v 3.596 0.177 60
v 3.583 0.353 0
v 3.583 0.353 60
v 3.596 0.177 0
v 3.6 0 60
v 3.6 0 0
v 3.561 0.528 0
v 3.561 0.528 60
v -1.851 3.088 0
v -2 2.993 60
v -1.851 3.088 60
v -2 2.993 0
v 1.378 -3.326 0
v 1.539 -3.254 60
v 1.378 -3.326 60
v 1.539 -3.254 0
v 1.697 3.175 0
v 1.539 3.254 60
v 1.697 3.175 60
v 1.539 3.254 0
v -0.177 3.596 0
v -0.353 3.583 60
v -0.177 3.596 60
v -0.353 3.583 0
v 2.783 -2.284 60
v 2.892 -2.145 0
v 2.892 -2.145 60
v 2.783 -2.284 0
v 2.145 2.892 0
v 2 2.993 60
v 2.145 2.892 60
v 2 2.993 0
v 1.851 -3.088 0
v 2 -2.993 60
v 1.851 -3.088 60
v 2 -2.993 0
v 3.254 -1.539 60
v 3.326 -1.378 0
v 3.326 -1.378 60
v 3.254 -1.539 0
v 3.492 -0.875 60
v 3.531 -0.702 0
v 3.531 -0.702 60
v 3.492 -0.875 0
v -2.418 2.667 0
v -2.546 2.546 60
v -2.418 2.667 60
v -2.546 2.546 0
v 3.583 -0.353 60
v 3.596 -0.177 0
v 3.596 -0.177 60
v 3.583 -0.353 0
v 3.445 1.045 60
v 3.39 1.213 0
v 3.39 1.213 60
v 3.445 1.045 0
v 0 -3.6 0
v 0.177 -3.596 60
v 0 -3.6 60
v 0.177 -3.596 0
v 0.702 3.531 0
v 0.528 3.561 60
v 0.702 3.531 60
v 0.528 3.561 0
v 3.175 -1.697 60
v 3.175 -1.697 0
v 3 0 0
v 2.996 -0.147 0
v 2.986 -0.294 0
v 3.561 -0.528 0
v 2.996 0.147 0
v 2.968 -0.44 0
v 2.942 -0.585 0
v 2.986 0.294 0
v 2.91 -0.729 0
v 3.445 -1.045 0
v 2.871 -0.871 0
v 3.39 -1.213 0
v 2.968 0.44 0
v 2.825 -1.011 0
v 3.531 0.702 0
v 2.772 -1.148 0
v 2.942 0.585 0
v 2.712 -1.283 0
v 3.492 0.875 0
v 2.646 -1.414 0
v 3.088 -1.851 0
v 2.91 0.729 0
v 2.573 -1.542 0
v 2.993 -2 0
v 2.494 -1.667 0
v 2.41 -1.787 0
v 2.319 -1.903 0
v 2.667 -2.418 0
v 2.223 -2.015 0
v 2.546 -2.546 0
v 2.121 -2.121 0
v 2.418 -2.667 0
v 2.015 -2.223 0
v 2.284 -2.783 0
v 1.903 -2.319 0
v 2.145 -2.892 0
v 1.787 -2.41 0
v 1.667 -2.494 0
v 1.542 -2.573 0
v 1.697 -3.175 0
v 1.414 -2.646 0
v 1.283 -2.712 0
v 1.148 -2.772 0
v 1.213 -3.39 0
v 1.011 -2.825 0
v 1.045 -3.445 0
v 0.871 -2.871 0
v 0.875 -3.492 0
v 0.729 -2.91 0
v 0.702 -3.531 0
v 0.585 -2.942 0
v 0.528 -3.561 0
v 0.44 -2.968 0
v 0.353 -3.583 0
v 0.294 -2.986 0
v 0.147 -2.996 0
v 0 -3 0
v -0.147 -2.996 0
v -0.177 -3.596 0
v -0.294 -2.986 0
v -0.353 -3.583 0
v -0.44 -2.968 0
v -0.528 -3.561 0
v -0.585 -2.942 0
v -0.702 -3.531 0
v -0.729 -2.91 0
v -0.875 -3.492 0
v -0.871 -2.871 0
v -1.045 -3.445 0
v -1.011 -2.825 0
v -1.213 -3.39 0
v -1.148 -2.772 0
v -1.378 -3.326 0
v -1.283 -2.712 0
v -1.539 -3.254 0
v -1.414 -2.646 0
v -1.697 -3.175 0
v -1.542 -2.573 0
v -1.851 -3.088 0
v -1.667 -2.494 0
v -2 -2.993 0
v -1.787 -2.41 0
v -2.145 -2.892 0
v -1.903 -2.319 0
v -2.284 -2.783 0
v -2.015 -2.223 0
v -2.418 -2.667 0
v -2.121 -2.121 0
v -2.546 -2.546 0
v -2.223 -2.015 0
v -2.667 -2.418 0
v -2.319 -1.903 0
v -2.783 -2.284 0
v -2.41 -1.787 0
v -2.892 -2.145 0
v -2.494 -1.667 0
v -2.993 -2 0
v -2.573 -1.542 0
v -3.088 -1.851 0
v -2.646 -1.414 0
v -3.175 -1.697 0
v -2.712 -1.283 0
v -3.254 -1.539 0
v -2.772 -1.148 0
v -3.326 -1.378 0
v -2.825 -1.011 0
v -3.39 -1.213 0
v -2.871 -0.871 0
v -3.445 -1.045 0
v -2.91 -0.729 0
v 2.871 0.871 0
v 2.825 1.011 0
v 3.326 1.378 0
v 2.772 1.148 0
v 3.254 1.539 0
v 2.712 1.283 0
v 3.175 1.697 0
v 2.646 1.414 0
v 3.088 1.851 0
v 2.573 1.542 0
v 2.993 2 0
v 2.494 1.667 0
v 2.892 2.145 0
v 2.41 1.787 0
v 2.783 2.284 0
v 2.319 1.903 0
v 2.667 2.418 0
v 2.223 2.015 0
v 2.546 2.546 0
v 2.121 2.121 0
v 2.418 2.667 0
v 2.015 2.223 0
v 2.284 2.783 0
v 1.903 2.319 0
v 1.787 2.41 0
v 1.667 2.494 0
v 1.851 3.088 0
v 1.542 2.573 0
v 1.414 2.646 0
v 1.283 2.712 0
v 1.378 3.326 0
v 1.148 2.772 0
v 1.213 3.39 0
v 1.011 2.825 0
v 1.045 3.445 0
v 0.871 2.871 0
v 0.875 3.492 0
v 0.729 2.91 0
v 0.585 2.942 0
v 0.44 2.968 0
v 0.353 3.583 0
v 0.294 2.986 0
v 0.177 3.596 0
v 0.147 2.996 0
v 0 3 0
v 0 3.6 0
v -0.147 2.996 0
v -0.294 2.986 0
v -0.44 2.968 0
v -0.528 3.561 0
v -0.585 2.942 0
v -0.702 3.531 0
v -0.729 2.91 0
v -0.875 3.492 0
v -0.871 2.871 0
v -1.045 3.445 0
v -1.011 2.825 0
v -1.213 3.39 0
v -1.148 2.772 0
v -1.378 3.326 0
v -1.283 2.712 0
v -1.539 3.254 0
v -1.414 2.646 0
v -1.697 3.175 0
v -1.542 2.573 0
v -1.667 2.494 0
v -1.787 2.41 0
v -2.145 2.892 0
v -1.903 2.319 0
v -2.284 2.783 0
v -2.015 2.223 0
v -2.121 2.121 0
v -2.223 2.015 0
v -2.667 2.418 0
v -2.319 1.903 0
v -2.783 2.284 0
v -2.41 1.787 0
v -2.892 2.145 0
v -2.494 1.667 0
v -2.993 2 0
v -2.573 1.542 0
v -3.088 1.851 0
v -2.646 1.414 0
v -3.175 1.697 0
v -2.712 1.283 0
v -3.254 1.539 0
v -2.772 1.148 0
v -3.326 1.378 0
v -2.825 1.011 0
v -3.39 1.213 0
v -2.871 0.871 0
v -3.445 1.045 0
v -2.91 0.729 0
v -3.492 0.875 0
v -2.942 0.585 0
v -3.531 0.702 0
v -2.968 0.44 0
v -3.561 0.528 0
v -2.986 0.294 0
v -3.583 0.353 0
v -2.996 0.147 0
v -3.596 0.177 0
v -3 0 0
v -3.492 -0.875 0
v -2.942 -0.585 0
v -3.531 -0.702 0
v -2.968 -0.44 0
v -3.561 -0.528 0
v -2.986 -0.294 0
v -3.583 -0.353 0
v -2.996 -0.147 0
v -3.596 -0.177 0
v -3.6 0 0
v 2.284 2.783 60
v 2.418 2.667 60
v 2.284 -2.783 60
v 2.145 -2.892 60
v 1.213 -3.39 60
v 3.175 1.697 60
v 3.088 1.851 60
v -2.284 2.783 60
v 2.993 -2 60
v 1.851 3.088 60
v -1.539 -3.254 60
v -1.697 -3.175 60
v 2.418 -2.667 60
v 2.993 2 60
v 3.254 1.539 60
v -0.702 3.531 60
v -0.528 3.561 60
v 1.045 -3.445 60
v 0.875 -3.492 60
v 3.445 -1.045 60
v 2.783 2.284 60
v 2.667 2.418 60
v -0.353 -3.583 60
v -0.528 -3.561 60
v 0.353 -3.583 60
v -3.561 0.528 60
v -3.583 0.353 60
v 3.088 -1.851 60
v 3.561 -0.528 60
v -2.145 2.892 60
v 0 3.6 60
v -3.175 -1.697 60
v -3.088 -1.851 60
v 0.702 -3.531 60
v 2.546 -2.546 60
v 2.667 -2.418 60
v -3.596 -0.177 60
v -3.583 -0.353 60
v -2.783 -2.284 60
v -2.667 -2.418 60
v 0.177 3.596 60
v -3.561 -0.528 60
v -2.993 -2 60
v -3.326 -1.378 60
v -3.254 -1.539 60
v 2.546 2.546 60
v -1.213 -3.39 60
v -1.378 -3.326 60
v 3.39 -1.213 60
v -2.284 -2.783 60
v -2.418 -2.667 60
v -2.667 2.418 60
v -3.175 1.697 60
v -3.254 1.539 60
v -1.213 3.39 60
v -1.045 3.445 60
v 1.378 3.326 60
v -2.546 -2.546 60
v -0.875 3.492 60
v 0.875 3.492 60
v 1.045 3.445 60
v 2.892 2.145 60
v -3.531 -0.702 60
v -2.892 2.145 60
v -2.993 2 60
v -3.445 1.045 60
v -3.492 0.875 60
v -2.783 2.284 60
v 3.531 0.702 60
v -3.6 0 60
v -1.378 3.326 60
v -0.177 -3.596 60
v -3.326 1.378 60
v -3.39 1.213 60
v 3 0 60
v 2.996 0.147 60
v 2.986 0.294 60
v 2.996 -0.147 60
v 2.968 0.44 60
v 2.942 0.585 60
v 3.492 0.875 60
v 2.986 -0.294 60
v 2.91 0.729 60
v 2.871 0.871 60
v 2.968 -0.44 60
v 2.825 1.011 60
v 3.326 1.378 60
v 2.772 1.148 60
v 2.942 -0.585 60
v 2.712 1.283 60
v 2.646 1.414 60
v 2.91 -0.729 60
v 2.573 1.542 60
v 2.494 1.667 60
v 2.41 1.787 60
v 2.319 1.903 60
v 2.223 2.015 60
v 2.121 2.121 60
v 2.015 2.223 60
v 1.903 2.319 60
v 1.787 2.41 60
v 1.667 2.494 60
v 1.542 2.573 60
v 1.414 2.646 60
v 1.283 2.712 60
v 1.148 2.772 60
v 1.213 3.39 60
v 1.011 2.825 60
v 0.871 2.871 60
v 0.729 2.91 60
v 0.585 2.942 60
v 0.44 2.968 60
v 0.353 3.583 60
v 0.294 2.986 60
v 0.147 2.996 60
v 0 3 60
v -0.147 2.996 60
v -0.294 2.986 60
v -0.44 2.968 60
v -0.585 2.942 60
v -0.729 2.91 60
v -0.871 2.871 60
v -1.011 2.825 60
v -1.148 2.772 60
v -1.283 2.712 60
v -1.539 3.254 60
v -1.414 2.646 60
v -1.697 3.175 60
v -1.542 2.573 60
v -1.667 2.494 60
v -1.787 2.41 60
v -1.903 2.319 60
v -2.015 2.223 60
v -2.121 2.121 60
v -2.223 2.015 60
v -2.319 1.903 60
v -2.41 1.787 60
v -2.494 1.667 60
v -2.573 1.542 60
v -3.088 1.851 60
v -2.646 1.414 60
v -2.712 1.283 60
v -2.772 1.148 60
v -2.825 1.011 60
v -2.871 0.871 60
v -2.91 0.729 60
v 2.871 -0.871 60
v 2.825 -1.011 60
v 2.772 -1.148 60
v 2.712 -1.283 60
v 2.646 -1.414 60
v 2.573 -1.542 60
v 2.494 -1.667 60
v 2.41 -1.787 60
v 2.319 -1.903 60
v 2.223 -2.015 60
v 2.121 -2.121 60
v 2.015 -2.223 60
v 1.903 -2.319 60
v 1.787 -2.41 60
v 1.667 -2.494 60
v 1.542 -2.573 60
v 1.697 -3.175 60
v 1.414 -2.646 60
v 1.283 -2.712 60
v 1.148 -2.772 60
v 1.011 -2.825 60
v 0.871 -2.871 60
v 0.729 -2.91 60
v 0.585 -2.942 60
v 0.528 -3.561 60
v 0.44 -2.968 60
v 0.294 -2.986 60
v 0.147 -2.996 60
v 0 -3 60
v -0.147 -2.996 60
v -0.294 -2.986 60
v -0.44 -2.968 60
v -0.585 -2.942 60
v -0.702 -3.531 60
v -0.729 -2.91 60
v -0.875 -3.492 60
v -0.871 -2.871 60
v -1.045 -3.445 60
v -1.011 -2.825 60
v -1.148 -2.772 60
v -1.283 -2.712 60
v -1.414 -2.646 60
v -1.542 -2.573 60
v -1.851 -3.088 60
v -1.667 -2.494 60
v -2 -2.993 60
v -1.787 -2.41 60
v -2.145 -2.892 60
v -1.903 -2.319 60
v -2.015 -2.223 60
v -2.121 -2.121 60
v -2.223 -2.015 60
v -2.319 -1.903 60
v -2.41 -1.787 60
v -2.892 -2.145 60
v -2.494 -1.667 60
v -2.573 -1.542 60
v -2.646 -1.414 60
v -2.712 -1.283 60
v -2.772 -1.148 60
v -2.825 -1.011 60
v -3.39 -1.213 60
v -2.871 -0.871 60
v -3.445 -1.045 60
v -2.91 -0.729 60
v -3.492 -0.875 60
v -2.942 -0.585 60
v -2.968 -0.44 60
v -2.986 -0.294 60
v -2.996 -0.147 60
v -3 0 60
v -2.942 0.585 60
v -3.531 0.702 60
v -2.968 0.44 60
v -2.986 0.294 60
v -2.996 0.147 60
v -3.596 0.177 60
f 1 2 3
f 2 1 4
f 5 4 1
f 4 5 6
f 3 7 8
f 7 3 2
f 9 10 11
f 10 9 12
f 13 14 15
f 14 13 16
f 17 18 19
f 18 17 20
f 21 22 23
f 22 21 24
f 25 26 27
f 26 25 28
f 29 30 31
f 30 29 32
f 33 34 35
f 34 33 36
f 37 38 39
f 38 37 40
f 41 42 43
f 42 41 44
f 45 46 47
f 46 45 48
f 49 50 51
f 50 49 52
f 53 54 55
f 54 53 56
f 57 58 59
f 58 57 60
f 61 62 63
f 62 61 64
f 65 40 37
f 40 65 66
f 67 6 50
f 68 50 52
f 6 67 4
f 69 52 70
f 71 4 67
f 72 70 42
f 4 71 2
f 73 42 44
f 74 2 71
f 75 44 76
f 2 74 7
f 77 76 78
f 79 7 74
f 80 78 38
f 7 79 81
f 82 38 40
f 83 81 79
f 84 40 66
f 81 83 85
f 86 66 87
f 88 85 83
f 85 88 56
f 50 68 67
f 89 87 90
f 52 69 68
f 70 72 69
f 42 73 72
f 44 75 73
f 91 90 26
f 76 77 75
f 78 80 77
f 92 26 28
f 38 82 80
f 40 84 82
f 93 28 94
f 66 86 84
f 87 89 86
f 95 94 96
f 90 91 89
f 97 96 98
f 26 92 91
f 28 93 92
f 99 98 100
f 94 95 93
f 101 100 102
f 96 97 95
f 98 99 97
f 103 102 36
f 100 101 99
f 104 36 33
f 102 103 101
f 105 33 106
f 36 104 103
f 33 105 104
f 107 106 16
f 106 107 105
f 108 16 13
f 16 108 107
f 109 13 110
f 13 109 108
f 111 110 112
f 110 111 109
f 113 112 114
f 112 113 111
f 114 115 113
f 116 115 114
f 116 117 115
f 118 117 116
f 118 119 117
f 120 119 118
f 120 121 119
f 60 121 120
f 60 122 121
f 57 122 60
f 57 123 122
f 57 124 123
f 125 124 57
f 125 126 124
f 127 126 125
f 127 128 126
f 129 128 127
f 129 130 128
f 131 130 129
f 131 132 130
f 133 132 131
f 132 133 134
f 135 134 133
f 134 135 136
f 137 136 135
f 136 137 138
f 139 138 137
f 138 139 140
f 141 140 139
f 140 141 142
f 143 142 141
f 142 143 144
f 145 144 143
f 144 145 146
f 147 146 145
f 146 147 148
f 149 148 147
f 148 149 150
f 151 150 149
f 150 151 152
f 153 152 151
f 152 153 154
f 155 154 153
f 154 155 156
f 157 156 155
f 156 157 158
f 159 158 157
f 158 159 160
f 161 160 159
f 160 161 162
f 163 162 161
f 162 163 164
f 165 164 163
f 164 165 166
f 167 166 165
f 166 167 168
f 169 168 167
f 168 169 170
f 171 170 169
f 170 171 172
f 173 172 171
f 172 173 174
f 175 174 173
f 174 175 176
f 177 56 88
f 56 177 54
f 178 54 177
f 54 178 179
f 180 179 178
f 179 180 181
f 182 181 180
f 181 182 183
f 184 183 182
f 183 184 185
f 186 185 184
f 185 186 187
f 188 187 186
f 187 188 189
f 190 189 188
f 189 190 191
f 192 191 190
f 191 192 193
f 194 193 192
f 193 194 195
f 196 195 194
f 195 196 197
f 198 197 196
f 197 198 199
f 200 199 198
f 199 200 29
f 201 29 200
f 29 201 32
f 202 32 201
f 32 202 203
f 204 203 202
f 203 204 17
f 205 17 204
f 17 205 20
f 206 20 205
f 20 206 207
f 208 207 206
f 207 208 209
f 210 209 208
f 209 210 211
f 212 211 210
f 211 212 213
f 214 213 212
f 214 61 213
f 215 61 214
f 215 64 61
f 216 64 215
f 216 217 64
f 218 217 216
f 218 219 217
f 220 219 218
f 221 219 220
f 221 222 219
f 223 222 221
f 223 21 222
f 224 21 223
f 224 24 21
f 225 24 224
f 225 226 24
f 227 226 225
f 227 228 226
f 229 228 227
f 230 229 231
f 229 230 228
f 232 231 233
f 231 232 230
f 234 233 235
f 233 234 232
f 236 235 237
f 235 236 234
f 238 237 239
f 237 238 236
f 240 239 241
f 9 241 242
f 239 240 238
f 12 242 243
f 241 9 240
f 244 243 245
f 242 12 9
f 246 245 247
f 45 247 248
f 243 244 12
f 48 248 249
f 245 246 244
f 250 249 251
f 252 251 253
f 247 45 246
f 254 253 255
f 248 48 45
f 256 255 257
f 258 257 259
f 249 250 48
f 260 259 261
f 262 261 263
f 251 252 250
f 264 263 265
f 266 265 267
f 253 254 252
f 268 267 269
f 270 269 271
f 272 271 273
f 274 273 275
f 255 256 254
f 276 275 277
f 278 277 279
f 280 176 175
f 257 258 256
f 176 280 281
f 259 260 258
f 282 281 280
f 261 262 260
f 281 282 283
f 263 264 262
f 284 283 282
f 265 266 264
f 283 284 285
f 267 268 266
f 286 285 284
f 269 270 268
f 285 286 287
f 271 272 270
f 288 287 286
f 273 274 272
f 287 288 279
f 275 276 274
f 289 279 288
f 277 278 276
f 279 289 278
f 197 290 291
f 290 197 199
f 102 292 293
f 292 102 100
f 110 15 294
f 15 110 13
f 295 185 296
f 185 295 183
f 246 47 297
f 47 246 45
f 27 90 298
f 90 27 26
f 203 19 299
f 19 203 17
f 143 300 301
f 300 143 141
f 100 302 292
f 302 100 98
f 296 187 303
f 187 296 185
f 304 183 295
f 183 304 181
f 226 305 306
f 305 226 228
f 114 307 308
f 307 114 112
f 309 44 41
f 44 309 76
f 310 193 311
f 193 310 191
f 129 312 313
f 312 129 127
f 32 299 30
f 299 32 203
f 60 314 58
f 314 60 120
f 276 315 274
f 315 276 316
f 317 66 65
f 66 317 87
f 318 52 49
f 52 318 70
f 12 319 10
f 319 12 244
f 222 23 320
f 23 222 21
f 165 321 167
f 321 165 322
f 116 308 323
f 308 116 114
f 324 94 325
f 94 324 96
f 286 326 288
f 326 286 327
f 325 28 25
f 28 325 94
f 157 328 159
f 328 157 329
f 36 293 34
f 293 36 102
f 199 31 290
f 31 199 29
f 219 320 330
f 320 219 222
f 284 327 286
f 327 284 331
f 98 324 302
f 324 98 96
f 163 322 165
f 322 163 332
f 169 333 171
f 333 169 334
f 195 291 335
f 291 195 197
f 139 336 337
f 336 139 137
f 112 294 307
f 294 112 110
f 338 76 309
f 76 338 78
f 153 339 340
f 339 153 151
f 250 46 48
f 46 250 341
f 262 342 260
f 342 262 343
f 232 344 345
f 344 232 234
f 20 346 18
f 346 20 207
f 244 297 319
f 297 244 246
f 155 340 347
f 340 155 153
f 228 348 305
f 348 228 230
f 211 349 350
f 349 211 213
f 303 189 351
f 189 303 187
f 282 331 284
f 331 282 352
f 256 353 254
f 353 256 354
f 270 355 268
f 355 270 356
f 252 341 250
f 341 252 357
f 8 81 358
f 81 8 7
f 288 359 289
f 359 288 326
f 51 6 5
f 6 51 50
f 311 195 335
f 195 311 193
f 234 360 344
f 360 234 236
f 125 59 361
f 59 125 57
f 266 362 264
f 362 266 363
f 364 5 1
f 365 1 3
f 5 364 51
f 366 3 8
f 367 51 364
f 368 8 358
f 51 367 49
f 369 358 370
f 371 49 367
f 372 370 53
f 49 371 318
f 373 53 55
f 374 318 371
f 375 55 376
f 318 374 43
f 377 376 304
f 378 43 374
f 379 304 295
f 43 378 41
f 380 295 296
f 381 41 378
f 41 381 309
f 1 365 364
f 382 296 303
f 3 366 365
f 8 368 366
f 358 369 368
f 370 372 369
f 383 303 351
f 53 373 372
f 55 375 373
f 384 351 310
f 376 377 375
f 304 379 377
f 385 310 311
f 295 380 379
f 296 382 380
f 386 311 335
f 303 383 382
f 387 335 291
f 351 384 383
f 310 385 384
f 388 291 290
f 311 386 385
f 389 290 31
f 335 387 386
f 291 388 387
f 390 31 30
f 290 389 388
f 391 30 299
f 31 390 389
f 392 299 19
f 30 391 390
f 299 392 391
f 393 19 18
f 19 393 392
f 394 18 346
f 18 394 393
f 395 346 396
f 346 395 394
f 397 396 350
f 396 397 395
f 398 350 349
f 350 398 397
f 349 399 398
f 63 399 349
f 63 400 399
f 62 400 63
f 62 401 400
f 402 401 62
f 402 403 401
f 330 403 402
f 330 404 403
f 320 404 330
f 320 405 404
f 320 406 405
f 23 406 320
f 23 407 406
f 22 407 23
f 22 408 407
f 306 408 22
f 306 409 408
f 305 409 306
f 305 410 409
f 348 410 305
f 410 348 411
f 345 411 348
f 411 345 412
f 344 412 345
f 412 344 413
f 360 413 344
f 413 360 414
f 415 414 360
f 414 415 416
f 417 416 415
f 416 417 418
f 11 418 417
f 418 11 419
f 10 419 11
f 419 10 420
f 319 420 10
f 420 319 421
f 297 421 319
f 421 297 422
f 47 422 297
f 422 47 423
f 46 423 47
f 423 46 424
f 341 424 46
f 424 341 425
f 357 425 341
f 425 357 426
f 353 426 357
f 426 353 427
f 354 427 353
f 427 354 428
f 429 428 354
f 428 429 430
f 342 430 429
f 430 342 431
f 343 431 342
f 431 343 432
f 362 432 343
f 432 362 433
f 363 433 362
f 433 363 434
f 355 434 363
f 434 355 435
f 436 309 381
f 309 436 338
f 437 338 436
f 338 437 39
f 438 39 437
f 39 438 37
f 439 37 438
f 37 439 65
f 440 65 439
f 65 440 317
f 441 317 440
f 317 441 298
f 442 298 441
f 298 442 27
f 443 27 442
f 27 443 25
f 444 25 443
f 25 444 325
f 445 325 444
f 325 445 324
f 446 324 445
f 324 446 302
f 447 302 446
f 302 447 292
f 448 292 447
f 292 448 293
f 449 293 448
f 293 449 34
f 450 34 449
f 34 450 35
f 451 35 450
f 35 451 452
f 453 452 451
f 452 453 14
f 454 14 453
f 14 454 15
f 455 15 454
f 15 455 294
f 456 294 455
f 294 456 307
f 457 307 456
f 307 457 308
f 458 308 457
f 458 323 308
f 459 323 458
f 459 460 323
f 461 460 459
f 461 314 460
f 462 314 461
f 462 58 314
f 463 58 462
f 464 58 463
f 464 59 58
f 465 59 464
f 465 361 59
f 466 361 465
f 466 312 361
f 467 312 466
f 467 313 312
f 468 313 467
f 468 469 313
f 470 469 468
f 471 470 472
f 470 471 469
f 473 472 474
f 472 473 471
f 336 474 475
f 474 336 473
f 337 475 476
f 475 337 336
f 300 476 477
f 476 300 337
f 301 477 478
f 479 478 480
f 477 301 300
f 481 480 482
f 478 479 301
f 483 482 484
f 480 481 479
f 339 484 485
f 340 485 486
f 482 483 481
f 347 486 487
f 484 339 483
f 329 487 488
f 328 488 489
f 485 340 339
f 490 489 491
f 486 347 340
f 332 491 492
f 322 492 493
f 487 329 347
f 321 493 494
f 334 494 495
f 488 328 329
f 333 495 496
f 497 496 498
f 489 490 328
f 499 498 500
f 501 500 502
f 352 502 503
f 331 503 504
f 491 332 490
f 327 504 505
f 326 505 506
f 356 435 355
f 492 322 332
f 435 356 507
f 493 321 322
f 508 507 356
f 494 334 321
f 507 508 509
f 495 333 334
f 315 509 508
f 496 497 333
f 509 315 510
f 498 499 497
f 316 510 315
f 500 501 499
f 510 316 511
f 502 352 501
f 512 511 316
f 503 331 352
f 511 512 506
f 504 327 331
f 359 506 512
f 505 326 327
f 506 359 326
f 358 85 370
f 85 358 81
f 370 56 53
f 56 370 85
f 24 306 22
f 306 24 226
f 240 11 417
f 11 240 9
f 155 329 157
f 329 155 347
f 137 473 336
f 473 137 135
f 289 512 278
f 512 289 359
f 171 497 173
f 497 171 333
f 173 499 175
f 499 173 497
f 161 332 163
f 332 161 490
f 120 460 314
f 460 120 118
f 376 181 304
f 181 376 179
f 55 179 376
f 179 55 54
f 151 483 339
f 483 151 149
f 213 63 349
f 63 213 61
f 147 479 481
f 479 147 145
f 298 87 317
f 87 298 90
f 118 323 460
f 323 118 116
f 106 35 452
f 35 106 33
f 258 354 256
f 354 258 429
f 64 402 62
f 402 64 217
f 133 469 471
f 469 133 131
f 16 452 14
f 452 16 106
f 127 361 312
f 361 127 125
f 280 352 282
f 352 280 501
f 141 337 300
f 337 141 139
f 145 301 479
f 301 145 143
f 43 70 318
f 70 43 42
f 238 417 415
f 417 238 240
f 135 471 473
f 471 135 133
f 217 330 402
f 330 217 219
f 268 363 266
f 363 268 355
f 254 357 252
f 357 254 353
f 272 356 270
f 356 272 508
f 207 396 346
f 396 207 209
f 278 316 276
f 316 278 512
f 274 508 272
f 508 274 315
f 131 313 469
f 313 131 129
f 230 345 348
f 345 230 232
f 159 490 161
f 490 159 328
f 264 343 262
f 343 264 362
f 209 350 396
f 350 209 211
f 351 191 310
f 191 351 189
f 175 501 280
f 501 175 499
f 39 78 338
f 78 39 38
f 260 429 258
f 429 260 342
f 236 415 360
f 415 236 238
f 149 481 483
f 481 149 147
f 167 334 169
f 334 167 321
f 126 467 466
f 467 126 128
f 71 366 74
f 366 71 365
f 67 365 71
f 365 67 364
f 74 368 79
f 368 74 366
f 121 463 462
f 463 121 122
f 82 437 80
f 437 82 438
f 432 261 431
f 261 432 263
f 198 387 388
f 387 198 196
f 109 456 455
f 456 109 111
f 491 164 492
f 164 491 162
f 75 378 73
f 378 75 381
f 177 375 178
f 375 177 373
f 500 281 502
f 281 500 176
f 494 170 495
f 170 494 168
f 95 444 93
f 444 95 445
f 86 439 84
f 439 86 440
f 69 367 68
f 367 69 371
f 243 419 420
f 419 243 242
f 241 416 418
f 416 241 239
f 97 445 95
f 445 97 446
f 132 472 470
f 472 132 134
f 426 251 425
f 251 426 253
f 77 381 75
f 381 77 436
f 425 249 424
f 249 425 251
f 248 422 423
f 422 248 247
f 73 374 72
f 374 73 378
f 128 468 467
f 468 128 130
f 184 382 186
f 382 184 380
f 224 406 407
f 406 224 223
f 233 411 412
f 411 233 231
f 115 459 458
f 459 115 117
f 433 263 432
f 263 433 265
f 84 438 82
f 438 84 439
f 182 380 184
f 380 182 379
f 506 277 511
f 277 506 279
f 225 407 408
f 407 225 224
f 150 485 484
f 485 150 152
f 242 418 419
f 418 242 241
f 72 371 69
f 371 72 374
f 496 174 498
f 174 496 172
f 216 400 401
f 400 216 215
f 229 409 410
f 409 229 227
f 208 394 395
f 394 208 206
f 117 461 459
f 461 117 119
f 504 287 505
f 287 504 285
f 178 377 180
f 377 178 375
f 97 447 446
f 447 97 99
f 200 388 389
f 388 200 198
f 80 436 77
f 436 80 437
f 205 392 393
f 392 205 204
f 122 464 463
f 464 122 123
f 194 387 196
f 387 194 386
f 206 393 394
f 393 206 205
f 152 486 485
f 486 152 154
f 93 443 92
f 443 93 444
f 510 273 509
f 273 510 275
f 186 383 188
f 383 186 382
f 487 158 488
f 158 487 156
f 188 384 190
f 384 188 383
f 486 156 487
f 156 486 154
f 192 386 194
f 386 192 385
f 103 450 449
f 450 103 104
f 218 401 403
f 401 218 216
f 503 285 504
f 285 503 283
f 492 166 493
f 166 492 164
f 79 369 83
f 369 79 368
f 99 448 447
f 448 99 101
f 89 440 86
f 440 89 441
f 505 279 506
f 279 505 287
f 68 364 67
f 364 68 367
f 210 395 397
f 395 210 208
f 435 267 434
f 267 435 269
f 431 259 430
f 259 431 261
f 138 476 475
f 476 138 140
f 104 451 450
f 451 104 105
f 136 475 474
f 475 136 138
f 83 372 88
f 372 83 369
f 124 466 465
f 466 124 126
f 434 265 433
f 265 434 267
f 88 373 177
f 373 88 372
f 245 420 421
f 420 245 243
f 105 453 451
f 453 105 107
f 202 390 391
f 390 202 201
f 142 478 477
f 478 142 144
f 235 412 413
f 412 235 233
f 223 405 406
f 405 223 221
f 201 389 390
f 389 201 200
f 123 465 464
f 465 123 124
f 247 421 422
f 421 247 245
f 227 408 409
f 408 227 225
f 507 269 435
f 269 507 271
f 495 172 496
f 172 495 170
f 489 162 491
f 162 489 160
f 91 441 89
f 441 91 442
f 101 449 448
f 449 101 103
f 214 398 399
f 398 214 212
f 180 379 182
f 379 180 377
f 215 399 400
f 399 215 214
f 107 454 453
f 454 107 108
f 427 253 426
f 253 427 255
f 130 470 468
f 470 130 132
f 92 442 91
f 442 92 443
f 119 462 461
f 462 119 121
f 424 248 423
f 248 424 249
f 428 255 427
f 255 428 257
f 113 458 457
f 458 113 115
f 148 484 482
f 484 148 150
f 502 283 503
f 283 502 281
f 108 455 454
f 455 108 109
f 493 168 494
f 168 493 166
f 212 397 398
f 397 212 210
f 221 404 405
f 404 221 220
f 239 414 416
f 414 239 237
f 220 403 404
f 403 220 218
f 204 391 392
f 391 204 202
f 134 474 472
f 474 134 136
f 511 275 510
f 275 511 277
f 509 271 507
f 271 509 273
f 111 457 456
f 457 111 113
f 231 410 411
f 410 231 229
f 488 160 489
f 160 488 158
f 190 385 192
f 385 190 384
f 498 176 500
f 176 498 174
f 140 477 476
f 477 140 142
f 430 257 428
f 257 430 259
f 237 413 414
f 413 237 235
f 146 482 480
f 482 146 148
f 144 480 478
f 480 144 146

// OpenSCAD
$fn = 128;

// Heatshrink sleeving (tubing)
inner_d = 6;          // mm
wall = 0.6;           // mm
length = 60;          // mm

outer_d = inner_d + 2*wall;

difference() {
  cylinder(h = length, d = outer_d, center = false);
  translate([0,0,-0.1])
    cylinder(h = length + 0.2, d = inner_d, center = false);
}
